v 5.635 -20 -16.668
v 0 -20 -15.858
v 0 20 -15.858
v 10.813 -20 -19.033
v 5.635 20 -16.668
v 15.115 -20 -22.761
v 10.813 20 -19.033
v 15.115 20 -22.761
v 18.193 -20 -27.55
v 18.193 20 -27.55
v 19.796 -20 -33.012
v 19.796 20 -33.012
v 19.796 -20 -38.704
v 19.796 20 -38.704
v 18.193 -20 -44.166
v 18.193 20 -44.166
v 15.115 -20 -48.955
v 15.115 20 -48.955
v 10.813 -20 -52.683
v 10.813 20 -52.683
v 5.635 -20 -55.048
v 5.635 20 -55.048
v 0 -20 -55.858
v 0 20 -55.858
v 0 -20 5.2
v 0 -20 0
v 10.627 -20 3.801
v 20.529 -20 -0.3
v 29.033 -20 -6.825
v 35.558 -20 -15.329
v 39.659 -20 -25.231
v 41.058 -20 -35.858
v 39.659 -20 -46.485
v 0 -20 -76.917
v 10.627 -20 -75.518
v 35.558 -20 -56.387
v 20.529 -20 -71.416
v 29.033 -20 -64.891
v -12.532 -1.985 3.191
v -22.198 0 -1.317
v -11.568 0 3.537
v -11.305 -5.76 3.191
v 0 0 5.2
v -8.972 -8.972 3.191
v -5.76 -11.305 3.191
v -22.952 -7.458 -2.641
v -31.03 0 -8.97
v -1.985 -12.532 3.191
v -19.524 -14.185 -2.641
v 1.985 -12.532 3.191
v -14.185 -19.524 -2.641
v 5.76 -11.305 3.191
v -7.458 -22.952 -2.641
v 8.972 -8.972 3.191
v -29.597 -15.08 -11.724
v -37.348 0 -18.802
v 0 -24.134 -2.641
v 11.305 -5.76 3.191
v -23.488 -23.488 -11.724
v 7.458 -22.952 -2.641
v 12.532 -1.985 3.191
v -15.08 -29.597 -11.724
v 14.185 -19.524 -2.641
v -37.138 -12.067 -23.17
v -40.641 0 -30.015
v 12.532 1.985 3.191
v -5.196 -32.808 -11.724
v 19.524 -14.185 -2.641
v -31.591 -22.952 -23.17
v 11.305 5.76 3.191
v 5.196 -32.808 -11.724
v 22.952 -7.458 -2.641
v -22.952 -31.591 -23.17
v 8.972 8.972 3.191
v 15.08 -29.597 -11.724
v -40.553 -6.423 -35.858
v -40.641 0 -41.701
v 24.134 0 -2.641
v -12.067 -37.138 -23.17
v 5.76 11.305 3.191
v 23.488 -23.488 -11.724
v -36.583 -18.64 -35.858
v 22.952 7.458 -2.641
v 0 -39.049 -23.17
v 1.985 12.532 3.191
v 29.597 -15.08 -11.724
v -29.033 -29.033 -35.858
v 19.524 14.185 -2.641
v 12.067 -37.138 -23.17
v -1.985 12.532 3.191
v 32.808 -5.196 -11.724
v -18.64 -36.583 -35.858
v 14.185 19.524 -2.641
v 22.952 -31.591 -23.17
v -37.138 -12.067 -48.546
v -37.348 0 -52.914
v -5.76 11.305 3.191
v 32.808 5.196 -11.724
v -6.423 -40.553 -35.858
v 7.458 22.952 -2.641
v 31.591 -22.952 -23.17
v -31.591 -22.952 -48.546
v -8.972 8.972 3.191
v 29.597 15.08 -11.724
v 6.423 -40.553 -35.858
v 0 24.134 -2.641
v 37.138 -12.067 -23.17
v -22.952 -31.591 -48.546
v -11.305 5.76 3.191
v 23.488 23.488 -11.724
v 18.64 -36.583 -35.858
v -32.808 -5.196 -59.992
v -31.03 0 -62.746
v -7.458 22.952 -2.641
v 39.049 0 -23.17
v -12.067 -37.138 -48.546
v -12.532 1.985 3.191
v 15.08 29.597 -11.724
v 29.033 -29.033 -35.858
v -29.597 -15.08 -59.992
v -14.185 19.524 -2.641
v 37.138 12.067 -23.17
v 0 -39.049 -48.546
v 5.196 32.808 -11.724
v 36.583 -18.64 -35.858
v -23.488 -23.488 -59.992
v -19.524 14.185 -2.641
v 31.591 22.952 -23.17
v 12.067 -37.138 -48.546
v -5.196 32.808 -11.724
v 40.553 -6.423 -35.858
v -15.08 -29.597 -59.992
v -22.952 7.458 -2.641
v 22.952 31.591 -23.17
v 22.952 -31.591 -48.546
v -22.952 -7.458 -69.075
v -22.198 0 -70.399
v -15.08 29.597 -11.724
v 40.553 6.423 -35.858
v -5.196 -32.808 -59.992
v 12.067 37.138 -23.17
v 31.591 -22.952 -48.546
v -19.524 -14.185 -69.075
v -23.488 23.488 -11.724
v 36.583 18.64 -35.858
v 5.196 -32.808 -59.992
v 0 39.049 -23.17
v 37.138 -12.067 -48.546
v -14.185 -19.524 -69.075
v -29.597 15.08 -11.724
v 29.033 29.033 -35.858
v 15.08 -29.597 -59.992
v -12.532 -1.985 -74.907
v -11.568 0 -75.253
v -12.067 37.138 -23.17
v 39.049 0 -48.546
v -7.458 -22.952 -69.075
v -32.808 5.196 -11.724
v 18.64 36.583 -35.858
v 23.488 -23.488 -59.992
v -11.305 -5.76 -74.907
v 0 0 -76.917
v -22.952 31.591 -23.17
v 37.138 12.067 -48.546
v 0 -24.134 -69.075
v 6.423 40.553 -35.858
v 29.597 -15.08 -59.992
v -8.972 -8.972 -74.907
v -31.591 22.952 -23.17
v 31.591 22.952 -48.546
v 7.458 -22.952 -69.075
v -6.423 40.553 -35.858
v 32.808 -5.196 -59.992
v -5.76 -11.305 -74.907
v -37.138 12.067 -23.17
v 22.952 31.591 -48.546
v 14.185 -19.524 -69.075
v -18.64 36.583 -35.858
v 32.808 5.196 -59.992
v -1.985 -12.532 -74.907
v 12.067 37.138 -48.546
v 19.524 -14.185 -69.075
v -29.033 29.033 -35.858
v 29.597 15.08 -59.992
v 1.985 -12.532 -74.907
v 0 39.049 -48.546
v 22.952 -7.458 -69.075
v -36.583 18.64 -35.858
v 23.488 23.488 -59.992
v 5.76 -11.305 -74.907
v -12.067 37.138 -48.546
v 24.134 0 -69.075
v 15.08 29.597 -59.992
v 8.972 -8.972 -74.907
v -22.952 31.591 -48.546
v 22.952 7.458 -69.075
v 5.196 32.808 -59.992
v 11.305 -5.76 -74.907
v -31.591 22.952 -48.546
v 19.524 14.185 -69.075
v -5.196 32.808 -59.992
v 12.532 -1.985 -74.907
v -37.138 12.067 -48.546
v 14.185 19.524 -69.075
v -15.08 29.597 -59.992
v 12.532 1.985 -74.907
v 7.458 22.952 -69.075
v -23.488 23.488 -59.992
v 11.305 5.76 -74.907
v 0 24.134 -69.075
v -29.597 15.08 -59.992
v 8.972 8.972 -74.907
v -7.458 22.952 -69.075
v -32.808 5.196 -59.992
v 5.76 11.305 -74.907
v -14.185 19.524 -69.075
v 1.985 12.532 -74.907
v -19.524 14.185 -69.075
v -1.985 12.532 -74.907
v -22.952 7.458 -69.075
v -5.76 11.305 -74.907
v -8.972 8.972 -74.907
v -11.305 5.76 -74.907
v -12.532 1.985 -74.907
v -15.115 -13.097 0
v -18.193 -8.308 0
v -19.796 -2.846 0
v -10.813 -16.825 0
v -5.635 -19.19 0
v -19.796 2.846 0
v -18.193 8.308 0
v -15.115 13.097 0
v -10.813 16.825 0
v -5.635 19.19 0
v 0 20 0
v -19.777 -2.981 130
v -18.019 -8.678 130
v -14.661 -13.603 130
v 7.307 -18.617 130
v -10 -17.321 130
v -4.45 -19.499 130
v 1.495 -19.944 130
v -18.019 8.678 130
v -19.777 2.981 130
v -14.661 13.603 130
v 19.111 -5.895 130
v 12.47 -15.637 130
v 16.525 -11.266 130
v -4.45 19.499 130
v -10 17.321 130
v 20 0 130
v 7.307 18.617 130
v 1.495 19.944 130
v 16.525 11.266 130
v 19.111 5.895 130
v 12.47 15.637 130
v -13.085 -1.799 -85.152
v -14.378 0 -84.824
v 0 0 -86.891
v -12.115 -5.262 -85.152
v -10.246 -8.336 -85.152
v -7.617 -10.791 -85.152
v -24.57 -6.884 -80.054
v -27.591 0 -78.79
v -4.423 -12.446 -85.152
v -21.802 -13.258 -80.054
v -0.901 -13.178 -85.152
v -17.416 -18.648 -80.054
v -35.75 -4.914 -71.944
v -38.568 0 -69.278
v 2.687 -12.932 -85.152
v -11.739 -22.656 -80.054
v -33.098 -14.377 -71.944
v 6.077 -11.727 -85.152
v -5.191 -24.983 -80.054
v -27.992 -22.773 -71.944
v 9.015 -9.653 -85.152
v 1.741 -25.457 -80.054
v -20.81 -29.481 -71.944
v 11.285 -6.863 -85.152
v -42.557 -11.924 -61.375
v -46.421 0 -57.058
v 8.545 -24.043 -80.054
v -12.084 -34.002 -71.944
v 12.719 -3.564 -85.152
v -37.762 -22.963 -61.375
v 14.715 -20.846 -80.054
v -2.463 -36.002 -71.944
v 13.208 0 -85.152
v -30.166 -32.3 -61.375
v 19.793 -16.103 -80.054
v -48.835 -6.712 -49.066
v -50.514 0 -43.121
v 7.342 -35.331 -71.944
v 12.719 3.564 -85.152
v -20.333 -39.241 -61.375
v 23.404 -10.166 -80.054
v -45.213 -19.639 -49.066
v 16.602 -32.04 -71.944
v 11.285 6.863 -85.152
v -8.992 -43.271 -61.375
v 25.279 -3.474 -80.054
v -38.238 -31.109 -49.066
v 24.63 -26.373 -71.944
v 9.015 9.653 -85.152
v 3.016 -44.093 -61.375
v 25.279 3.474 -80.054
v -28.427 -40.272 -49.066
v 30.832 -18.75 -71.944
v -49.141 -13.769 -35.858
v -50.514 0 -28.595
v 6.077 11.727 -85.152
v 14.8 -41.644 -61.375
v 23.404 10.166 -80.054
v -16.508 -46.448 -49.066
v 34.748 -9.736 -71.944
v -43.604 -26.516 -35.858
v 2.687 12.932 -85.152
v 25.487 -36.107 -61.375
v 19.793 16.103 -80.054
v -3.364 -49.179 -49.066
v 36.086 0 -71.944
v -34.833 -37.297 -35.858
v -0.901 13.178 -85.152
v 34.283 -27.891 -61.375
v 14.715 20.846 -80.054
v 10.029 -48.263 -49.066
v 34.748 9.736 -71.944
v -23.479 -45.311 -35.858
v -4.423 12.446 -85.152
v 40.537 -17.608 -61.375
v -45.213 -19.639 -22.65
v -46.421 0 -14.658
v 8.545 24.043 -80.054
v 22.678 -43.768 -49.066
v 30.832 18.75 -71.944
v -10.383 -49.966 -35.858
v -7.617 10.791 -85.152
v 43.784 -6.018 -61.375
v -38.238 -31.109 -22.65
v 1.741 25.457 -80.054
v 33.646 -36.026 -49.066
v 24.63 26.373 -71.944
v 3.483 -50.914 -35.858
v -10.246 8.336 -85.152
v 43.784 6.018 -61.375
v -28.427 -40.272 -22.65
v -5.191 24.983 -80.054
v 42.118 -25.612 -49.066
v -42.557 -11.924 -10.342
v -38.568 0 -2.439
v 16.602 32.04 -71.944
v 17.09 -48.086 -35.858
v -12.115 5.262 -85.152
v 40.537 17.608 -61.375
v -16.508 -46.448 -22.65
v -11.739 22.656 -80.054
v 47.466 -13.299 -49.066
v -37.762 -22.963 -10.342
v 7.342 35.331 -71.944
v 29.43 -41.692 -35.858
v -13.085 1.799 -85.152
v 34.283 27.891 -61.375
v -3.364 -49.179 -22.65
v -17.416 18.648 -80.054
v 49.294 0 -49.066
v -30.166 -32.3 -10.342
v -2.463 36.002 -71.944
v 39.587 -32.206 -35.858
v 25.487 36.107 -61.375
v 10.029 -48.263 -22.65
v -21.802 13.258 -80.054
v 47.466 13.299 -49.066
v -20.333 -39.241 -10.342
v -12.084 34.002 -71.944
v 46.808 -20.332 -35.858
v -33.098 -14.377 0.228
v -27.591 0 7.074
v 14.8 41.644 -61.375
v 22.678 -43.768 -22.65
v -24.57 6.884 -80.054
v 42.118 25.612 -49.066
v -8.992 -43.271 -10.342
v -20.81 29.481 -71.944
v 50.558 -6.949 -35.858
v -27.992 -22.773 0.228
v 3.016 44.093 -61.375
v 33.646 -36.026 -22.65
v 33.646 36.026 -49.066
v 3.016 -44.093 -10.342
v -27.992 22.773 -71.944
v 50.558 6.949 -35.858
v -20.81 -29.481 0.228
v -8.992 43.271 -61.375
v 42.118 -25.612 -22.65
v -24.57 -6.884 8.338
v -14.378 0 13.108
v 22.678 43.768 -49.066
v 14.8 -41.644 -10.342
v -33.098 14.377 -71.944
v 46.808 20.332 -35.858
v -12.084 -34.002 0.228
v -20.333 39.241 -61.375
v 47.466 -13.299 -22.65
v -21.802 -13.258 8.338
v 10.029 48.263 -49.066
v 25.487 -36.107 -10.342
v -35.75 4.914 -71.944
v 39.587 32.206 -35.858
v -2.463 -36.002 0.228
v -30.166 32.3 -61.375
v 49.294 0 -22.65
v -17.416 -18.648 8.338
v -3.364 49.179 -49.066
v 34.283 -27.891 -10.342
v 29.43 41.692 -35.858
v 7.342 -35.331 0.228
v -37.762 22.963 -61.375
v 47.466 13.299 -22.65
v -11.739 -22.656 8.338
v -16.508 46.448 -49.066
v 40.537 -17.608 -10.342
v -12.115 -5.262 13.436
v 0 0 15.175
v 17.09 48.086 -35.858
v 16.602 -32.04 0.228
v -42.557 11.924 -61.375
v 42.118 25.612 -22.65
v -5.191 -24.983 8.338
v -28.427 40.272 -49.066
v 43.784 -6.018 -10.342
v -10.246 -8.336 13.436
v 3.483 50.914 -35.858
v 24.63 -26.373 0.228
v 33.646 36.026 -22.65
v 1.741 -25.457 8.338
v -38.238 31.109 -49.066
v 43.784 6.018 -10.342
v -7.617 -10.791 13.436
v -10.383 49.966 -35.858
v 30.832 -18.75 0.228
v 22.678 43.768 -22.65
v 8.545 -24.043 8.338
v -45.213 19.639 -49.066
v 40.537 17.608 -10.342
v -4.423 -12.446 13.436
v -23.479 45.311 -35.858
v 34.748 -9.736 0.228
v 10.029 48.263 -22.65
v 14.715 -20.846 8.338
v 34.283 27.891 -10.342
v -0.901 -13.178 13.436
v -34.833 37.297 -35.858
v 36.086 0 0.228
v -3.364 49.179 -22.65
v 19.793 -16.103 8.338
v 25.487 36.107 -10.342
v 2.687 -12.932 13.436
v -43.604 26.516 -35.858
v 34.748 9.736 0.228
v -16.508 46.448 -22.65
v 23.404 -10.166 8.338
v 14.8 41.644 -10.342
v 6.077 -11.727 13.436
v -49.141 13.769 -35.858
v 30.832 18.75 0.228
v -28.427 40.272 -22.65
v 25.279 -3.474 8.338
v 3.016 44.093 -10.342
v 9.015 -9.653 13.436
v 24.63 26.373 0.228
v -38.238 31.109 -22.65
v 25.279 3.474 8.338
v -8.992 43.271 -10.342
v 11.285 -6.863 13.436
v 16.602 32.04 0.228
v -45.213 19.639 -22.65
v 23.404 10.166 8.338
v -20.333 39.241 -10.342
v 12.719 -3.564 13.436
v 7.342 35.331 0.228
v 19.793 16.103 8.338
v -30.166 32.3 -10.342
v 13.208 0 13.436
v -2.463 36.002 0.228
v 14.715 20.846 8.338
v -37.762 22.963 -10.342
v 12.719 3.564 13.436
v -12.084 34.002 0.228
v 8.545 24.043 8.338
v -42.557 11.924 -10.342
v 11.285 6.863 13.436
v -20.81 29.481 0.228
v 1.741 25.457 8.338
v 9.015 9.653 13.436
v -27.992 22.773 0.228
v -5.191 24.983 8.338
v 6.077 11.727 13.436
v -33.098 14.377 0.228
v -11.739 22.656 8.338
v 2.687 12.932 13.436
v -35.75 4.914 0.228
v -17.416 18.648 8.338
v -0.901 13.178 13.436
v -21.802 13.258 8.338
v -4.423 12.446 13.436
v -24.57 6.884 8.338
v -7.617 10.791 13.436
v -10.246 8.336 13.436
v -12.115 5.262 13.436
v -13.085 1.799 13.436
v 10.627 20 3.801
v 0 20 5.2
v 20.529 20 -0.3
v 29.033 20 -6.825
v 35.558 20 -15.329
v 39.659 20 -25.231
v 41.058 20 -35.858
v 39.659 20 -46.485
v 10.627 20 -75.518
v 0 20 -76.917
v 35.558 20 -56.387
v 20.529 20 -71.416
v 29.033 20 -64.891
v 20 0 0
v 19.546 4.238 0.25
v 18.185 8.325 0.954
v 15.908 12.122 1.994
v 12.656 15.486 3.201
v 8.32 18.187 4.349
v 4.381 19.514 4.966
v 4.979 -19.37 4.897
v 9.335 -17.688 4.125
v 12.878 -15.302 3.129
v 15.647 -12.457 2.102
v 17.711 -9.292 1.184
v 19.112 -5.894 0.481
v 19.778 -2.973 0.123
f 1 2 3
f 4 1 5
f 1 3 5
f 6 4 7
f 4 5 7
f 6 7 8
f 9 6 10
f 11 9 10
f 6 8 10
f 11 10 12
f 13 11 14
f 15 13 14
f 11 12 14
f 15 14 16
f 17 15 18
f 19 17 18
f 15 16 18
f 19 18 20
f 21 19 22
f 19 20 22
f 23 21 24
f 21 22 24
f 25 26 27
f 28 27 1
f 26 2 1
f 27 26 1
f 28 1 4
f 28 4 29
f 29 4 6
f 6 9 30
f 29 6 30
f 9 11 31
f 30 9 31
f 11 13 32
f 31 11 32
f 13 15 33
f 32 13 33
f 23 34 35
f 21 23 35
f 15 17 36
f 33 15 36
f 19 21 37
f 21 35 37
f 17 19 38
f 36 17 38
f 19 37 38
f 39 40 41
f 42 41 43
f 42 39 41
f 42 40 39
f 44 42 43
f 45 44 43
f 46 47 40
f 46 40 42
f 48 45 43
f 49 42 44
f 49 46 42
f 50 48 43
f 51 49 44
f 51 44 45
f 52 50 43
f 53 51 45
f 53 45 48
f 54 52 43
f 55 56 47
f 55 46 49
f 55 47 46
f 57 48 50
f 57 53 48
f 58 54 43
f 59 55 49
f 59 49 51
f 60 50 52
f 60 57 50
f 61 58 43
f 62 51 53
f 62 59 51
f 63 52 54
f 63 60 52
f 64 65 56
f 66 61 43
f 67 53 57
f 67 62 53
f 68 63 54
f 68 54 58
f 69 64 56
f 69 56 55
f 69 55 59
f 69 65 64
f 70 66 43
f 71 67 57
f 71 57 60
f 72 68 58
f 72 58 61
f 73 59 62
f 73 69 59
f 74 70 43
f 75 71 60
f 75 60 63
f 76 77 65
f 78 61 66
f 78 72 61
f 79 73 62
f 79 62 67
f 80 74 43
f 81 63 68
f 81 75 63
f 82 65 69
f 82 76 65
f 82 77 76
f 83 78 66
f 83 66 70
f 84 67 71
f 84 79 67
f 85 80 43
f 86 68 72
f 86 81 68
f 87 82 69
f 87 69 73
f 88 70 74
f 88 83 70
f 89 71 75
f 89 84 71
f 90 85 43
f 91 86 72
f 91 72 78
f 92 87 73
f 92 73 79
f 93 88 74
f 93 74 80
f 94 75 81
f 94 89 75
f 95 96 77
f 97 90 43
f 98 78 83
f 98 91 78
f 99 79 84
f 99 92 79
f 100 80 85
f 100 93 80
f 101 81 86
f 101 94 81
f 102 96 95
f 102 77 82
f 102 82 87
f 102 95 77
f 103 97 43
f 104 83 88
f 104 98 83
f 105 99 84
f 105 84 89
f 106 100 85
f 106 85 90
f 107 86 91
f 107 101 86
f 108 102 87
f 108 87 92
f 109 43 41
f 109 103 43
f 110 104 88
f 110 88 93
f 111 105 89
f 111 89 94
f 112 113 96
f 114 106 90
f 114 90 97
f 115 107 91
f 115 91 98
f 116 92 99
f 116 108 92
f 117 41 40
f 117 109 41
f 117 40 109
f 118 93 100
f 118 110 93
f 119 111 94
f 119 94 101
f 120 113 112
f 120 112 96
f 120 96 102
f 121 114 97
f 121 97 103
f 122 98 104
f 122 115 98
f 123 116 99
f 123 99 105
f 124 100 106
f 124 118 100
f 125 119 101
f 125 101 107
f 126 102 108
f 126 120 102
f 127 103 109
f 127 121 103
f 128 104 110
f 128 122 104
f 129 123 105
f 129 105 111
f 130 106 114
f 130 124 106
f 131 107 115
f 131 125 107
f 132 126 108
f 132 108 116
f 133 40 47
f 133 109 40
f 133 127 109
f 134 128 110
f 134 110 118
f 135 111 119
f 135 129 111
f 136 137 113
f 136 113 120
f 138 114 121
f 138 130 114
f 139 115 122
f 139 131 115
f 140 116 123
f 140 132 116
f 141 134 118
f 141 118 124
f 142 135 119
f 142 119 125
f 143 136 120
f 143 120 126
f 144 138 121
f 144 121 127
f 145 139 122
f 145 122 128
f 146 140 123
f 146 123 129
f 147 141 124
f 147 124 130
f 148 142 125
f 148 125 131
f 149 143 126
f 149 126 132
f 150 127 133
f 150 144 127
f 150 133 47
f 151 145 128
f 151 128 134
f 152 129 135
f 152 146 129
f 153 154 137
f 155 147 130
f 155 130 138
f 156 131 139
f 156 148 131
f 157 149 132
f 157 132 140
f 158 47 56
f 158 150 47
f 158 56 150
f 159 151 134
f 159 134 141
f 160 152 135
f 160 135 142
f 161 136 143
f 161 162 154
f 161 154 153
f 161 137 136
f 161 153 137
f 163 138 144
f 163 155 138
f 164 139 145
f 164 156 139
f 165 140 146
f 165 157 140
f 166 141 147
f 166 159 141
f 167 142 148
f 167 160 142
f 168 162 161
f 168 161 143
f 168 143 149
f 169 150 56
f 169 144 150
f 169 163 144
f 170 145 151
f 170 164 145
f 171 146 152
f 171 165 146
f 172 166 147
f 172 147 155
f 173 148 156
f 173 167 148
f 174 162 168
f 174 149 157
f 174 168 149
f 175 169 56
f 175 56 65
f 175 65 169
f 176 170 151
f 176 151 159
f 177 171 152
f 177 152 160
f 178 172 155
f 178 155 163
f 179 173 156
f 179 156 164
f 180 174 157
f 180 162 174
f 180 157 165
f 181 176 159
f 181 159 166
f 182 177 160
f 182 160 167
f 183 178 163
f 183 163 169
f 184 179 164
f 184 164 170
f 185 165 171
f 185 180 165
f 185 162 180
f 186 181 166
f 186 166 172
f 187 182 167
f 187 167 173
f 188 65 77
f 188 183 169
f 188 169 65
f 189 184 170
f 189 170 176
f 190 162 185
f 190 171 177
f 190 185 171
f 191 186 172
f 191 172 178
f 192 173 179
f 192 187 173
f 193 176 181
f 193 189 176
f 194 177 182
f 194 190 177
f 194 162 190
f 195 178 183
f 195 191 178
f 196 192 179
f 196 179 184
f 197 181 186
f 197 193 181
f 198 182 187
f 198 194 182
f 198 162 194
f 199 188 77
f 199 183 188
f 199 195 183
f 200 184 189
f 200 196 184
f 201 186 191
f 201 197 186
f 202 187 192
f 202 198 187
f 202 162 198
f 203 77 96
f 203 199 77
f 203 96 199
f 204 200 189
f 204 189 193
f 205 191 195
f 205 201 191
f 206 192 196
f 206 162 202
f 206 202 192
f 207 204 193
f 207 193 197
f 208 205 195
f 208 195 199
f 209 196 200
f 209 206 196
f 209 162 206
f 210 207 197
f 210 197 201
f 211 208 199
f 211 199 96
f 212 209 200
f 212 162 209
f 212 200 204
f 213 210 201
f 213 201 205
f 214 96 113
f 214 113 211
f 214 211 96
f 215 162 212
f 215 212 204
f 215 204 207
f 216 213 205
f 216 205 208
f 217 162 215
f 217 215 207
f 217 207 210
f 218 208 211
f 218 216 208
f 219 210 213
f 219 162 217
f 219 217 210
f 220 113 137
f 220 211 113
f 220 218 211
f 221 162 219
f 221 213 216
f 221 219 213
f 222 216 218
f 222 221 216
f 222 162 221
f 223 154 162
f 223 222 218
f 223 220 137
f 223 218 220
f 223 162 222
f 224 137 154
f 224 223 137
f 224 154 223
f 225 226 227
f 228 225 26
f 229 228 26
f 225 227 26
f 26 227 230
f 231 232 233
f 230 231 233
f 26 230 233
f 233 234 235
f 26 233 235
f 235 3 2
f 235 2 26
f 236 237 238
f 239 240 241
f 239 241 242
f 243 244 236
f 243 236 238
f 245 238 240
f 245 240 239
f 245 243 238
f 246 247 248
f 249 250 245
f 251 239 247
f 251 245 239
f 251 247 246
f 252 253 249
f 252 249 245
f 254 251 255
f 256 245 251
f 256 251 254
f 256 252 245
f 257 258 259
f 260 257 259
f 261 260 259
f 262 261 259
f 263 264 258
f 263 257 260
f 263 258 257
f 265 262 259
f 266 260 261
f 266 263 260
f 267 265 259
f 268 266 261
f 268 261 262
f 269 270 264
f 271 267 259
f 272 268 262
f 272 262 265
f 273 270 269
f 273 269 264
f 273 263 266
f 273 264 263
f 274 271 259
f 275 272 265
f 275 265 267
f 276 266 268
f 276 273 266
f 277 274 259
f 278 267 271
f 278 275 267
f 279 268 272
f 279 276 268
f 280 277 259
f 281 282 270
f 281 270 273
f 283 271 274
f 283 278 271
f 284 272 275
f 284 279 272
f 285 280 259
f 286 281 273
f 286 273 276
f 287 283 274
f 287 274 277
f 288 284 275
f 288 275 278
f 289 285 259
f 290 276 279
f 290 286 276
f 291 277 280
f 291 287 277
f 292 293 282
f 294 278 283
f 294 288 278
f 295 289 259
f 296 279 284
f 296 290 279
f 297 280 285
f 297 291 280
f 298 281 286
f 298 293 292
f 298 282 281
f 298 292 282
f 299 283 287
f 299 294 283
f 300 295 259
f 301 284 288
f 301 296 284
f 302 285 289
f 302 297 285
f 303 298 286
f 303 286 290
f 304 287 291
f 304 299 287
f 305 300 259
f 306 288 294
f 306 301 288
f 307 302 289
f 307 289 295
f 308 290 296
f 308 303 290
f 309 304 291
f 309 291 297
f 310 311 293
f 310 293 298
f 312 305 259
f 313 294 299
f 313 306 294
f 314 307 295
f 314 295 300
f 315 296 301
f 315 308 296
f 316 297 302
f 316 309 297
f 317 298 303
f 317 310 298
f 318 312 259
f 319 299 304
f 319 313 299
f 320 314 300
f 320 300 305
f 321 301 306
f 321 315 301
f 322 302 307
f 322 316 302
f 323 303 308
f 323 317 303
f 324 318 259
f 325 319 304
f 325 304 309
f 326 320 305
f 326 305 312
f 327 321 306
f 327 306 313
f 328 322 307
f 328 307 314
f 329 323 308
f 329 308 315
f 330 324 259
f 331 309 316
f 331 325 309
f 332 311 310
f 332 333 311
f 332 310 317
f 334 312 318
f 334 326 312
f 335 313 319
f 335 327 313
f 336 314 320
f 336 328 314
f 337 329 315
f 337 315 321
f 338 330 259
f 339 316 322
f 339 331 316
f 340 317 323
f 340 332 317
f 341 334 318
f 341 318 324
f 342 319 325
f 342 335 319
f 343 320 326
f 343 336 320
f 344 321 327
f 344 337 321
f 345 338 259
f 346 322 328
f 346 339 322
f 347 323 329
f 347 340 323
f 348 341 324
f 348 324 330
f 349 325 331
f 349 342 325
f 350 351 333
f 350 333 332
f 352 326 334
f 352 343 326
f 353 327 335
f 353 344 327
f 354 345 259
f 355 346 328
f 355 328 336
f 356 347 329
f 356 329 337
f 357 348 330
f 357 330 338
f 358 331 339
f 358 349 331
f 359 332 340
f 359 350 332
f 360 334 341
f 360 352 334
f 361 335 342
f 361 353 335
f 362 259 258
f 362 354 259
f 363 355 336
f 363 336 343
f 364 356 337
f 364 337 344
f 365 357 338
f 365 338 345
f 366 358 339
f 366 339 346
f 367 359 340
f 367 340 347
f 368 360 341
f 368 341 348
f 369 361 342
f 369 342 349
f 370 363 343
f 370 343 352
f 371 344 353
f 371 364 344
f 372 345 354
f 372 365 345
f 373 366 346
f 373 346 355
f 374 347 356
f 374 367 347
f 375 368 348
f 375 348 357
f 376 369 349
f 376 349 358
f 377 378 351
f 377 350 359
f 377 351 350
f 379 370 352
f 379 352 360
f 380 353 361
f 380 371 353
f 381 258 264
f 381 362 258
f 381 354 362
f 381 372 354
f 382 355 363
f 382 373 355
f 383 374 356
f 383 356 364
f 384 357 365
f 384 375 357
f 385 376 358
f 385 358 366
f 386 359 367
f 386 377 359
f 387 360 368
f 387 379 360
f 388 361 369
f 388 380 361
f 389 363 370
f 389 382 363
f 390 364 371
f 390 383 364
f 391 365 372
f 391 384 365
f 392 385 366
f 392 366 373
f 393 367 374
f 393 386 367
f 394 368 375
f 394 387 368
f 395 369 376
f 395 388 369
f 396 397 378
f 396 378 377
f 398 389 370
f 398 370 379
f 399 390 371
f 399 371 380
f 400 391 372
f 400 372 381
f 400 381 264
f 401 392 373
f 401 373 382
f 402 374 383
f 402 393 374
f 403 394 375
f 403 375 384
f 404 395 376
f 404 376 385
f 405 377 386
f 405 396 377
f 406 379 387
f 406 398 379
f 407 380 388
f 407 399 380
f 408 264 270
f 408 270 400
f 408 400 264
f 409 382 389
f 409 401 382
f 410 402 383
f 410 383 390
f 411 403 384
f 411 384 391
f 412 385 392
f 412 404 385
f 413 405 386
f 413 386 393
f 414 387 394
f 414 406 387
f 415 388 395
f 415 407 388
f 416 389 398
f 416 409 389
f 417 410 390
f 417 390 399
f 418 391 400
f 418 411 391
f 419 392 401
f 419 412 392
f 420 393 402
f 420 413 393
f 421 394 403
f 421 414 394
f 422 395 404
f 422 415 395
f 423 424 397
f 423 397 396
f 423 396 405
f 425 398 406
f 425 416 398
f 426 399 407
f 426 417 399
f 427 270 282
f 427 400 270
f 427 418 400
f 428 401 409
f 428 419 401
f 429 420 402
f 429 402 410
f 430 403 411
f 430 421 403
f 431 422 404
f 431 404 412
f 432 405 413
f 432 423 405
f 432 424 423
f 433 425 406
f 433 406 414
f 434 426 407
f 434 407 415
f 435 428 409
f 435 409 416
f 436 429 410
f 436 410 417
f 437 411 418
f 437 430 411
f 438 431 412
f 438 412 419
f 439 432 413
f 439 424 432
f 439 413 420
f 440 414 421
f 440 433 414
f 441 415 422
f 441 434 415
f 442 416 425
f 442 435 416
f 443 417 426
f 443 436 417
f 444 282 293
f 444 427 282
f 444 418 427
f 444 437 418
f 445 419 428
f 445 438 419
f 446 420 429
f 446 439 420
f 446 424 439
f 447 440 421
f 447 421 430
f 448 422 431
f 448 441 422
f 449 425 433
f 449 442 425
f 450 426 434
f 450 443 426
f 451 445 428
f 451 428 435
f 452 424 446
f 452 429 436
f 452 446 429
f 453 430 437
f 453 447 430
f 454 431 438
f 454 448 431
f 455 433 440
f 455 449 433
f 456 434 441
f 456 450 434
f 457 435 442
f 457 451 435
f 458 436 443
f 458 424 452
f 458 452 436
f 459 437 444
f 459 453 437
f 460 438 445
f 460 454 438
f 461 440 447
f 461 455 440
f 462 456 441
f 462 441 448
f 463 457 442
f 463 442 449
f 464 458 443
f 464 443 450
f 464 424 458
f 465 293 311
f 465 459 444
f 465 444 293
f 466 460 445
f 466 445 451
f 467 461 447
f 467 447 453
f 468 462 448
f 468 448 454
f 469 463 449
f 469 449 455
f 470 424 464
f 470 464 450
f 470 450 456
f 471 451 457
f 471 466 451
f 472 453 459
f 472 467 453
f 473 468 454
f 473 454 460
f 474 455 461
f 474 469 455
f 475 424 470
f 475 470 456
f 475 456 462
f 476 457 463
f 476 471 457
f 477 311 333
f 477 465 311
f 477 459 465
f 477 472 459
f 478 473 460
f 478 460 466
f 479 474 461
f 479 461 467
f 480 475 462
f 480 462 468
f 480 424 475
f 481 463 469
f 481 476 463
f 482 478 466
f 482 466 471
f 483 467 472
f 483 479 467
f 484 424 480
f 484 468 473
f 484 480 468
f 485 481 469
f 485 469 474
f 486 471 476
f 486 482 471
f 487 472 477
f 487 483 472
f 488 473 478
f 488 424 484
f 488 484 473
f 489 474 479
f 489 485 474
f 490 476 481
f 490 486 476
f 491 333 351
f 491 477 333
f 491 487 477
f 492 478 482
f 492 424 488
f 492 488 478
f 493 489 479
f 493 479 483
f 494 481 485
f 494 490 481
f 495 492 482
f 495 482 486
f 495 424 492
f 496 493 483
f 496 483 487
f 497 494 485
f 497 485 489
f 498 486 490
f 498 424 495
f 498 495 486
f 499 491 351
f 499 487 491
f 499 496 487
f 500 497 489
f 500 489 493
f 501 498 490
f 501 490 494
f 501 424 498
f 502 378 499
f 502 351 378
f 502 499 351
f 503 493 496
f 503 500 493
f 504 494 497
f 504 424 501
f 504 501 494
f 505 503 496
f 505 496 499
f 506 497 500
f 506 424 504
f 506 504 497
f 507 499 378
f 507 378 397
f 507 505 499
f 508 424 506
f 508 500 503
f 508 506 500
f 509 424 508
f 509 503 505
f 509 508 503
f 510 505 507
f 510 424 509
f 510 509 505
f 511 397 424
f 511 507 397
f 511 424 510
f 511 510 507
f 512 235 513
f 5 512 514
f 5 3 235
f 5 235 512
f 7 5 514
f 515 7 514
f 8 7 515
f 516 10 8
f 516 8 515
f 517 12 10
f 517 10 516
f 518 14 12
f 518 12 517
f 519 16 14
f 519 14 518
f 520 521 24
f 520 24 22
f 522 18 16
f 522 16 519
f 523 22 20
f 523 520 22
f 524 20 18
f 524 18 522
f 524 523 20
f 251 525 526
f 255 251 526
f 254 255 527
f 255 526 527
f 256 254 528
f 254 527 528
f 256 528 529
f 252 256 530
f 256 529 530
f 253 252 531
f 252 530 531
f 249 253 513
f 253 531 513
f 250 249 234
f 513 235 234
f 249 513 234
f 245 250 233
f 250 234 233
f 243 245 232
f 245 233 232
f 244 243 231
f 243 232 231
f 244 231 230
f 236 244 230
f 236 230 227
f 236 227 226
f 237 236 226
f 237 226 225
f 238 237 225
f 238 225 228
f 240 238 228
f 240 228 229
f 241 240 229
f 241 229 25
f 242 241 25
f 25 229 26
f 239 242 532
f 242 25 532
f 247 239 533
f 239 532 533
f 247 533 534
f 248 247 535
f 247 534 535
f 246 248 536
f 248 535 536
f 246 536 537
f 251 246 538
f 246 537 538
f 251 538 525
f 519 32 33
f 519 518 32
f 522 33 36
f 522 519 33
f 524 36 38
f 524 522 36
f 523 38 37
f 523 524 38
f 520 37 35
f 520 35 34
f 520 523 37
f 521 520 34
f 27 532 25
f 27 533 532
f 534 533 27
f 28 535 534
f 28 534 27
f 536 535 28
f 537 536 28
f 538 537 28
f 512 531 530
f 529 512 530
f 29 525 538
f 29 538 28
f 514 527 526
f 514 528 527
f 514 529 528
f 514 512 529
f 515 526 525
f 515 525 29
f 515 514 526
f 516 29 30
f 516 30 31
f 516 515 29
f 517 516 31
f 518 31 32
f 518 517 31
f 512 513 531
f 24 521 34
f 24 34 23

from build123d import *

# Parameters (mm, degrees)
SKETCH1_R           = 20
BOSS_EXTRUDE1_DEPTH = 130
BOSS_EXTRUDE2_DEPTH = 20
SKETCH8_R           = 20
CUT_EXTRUDE1_DEPTH  = 40


with BuildPart() as part:
    # Sketch1 → Boss-Extrude1 (new body)
    with BuildSketch(Plane.XY):
        Circle(SKETCH1_R)
    extrude(amount=BOSS_EXTRUDE1_DEPTH)

    # Sketch2 → Boss-Extrude2 (add, symmetric)
    with BuildSketch(Plane(origin=(0, 0, 0), x_dir=(1, 0, 0), z_dir=(0, 1, 0))):
        with BuildLine():
            ThreePointArc((41.058497276, 35.858056257), (29.032741849, 64.890798106), (0, 76.916553533))
            Line((0, 76.916553533), (0, -5.200441019))
            ThreePointArc((0, -5.200441019), (29.032741849, 6.825314408), (41.058497276, 35.858056257))
        make_face()
    extrude(amount=BOSS_EXTRUDE2_DEPTH, both=True)

    # Sketch8 → Cut-Extrude1 (cut)
    with BuildSketch(Plane(origin=(0, 20, 0), x_dir=(1, 0, 0), z_dir=(0, 1, 0))):
        with Locations((0, 35.858056257)):
            Circle(SKETCH8_R)
    extrude(amount=-CUT_EXTRUDE1_DEPTH, mode=Mode.SUBTRACT)


with BuildPart() as body_2:
    # Sketch2<9> → Revolve5 (revolve)
    with BuildSketch(Plane(origin=(0, 0, 0), x_dir=(1, 0, 0), z_dir=(0, 1, 0))):
        with BuildLine():
            Line((0, 76.916553533), (0, 86.891075769))
            ThreePointArc((0, 86.891075769), (-51.033019512, 35.858056257), (0, -15.174963255))
            Line((0, -15.174963255), (0, -5.200441019))
            ThreePointArc((0, -5.200441019), (-41.058497276, 35.858056257), (0, 76.916553533))
        make_face()
    revolve(axis=Axis((0, 0, -86.891075769), (0, 0, 1)))


solid = Compound([part.part, body_2.part])
